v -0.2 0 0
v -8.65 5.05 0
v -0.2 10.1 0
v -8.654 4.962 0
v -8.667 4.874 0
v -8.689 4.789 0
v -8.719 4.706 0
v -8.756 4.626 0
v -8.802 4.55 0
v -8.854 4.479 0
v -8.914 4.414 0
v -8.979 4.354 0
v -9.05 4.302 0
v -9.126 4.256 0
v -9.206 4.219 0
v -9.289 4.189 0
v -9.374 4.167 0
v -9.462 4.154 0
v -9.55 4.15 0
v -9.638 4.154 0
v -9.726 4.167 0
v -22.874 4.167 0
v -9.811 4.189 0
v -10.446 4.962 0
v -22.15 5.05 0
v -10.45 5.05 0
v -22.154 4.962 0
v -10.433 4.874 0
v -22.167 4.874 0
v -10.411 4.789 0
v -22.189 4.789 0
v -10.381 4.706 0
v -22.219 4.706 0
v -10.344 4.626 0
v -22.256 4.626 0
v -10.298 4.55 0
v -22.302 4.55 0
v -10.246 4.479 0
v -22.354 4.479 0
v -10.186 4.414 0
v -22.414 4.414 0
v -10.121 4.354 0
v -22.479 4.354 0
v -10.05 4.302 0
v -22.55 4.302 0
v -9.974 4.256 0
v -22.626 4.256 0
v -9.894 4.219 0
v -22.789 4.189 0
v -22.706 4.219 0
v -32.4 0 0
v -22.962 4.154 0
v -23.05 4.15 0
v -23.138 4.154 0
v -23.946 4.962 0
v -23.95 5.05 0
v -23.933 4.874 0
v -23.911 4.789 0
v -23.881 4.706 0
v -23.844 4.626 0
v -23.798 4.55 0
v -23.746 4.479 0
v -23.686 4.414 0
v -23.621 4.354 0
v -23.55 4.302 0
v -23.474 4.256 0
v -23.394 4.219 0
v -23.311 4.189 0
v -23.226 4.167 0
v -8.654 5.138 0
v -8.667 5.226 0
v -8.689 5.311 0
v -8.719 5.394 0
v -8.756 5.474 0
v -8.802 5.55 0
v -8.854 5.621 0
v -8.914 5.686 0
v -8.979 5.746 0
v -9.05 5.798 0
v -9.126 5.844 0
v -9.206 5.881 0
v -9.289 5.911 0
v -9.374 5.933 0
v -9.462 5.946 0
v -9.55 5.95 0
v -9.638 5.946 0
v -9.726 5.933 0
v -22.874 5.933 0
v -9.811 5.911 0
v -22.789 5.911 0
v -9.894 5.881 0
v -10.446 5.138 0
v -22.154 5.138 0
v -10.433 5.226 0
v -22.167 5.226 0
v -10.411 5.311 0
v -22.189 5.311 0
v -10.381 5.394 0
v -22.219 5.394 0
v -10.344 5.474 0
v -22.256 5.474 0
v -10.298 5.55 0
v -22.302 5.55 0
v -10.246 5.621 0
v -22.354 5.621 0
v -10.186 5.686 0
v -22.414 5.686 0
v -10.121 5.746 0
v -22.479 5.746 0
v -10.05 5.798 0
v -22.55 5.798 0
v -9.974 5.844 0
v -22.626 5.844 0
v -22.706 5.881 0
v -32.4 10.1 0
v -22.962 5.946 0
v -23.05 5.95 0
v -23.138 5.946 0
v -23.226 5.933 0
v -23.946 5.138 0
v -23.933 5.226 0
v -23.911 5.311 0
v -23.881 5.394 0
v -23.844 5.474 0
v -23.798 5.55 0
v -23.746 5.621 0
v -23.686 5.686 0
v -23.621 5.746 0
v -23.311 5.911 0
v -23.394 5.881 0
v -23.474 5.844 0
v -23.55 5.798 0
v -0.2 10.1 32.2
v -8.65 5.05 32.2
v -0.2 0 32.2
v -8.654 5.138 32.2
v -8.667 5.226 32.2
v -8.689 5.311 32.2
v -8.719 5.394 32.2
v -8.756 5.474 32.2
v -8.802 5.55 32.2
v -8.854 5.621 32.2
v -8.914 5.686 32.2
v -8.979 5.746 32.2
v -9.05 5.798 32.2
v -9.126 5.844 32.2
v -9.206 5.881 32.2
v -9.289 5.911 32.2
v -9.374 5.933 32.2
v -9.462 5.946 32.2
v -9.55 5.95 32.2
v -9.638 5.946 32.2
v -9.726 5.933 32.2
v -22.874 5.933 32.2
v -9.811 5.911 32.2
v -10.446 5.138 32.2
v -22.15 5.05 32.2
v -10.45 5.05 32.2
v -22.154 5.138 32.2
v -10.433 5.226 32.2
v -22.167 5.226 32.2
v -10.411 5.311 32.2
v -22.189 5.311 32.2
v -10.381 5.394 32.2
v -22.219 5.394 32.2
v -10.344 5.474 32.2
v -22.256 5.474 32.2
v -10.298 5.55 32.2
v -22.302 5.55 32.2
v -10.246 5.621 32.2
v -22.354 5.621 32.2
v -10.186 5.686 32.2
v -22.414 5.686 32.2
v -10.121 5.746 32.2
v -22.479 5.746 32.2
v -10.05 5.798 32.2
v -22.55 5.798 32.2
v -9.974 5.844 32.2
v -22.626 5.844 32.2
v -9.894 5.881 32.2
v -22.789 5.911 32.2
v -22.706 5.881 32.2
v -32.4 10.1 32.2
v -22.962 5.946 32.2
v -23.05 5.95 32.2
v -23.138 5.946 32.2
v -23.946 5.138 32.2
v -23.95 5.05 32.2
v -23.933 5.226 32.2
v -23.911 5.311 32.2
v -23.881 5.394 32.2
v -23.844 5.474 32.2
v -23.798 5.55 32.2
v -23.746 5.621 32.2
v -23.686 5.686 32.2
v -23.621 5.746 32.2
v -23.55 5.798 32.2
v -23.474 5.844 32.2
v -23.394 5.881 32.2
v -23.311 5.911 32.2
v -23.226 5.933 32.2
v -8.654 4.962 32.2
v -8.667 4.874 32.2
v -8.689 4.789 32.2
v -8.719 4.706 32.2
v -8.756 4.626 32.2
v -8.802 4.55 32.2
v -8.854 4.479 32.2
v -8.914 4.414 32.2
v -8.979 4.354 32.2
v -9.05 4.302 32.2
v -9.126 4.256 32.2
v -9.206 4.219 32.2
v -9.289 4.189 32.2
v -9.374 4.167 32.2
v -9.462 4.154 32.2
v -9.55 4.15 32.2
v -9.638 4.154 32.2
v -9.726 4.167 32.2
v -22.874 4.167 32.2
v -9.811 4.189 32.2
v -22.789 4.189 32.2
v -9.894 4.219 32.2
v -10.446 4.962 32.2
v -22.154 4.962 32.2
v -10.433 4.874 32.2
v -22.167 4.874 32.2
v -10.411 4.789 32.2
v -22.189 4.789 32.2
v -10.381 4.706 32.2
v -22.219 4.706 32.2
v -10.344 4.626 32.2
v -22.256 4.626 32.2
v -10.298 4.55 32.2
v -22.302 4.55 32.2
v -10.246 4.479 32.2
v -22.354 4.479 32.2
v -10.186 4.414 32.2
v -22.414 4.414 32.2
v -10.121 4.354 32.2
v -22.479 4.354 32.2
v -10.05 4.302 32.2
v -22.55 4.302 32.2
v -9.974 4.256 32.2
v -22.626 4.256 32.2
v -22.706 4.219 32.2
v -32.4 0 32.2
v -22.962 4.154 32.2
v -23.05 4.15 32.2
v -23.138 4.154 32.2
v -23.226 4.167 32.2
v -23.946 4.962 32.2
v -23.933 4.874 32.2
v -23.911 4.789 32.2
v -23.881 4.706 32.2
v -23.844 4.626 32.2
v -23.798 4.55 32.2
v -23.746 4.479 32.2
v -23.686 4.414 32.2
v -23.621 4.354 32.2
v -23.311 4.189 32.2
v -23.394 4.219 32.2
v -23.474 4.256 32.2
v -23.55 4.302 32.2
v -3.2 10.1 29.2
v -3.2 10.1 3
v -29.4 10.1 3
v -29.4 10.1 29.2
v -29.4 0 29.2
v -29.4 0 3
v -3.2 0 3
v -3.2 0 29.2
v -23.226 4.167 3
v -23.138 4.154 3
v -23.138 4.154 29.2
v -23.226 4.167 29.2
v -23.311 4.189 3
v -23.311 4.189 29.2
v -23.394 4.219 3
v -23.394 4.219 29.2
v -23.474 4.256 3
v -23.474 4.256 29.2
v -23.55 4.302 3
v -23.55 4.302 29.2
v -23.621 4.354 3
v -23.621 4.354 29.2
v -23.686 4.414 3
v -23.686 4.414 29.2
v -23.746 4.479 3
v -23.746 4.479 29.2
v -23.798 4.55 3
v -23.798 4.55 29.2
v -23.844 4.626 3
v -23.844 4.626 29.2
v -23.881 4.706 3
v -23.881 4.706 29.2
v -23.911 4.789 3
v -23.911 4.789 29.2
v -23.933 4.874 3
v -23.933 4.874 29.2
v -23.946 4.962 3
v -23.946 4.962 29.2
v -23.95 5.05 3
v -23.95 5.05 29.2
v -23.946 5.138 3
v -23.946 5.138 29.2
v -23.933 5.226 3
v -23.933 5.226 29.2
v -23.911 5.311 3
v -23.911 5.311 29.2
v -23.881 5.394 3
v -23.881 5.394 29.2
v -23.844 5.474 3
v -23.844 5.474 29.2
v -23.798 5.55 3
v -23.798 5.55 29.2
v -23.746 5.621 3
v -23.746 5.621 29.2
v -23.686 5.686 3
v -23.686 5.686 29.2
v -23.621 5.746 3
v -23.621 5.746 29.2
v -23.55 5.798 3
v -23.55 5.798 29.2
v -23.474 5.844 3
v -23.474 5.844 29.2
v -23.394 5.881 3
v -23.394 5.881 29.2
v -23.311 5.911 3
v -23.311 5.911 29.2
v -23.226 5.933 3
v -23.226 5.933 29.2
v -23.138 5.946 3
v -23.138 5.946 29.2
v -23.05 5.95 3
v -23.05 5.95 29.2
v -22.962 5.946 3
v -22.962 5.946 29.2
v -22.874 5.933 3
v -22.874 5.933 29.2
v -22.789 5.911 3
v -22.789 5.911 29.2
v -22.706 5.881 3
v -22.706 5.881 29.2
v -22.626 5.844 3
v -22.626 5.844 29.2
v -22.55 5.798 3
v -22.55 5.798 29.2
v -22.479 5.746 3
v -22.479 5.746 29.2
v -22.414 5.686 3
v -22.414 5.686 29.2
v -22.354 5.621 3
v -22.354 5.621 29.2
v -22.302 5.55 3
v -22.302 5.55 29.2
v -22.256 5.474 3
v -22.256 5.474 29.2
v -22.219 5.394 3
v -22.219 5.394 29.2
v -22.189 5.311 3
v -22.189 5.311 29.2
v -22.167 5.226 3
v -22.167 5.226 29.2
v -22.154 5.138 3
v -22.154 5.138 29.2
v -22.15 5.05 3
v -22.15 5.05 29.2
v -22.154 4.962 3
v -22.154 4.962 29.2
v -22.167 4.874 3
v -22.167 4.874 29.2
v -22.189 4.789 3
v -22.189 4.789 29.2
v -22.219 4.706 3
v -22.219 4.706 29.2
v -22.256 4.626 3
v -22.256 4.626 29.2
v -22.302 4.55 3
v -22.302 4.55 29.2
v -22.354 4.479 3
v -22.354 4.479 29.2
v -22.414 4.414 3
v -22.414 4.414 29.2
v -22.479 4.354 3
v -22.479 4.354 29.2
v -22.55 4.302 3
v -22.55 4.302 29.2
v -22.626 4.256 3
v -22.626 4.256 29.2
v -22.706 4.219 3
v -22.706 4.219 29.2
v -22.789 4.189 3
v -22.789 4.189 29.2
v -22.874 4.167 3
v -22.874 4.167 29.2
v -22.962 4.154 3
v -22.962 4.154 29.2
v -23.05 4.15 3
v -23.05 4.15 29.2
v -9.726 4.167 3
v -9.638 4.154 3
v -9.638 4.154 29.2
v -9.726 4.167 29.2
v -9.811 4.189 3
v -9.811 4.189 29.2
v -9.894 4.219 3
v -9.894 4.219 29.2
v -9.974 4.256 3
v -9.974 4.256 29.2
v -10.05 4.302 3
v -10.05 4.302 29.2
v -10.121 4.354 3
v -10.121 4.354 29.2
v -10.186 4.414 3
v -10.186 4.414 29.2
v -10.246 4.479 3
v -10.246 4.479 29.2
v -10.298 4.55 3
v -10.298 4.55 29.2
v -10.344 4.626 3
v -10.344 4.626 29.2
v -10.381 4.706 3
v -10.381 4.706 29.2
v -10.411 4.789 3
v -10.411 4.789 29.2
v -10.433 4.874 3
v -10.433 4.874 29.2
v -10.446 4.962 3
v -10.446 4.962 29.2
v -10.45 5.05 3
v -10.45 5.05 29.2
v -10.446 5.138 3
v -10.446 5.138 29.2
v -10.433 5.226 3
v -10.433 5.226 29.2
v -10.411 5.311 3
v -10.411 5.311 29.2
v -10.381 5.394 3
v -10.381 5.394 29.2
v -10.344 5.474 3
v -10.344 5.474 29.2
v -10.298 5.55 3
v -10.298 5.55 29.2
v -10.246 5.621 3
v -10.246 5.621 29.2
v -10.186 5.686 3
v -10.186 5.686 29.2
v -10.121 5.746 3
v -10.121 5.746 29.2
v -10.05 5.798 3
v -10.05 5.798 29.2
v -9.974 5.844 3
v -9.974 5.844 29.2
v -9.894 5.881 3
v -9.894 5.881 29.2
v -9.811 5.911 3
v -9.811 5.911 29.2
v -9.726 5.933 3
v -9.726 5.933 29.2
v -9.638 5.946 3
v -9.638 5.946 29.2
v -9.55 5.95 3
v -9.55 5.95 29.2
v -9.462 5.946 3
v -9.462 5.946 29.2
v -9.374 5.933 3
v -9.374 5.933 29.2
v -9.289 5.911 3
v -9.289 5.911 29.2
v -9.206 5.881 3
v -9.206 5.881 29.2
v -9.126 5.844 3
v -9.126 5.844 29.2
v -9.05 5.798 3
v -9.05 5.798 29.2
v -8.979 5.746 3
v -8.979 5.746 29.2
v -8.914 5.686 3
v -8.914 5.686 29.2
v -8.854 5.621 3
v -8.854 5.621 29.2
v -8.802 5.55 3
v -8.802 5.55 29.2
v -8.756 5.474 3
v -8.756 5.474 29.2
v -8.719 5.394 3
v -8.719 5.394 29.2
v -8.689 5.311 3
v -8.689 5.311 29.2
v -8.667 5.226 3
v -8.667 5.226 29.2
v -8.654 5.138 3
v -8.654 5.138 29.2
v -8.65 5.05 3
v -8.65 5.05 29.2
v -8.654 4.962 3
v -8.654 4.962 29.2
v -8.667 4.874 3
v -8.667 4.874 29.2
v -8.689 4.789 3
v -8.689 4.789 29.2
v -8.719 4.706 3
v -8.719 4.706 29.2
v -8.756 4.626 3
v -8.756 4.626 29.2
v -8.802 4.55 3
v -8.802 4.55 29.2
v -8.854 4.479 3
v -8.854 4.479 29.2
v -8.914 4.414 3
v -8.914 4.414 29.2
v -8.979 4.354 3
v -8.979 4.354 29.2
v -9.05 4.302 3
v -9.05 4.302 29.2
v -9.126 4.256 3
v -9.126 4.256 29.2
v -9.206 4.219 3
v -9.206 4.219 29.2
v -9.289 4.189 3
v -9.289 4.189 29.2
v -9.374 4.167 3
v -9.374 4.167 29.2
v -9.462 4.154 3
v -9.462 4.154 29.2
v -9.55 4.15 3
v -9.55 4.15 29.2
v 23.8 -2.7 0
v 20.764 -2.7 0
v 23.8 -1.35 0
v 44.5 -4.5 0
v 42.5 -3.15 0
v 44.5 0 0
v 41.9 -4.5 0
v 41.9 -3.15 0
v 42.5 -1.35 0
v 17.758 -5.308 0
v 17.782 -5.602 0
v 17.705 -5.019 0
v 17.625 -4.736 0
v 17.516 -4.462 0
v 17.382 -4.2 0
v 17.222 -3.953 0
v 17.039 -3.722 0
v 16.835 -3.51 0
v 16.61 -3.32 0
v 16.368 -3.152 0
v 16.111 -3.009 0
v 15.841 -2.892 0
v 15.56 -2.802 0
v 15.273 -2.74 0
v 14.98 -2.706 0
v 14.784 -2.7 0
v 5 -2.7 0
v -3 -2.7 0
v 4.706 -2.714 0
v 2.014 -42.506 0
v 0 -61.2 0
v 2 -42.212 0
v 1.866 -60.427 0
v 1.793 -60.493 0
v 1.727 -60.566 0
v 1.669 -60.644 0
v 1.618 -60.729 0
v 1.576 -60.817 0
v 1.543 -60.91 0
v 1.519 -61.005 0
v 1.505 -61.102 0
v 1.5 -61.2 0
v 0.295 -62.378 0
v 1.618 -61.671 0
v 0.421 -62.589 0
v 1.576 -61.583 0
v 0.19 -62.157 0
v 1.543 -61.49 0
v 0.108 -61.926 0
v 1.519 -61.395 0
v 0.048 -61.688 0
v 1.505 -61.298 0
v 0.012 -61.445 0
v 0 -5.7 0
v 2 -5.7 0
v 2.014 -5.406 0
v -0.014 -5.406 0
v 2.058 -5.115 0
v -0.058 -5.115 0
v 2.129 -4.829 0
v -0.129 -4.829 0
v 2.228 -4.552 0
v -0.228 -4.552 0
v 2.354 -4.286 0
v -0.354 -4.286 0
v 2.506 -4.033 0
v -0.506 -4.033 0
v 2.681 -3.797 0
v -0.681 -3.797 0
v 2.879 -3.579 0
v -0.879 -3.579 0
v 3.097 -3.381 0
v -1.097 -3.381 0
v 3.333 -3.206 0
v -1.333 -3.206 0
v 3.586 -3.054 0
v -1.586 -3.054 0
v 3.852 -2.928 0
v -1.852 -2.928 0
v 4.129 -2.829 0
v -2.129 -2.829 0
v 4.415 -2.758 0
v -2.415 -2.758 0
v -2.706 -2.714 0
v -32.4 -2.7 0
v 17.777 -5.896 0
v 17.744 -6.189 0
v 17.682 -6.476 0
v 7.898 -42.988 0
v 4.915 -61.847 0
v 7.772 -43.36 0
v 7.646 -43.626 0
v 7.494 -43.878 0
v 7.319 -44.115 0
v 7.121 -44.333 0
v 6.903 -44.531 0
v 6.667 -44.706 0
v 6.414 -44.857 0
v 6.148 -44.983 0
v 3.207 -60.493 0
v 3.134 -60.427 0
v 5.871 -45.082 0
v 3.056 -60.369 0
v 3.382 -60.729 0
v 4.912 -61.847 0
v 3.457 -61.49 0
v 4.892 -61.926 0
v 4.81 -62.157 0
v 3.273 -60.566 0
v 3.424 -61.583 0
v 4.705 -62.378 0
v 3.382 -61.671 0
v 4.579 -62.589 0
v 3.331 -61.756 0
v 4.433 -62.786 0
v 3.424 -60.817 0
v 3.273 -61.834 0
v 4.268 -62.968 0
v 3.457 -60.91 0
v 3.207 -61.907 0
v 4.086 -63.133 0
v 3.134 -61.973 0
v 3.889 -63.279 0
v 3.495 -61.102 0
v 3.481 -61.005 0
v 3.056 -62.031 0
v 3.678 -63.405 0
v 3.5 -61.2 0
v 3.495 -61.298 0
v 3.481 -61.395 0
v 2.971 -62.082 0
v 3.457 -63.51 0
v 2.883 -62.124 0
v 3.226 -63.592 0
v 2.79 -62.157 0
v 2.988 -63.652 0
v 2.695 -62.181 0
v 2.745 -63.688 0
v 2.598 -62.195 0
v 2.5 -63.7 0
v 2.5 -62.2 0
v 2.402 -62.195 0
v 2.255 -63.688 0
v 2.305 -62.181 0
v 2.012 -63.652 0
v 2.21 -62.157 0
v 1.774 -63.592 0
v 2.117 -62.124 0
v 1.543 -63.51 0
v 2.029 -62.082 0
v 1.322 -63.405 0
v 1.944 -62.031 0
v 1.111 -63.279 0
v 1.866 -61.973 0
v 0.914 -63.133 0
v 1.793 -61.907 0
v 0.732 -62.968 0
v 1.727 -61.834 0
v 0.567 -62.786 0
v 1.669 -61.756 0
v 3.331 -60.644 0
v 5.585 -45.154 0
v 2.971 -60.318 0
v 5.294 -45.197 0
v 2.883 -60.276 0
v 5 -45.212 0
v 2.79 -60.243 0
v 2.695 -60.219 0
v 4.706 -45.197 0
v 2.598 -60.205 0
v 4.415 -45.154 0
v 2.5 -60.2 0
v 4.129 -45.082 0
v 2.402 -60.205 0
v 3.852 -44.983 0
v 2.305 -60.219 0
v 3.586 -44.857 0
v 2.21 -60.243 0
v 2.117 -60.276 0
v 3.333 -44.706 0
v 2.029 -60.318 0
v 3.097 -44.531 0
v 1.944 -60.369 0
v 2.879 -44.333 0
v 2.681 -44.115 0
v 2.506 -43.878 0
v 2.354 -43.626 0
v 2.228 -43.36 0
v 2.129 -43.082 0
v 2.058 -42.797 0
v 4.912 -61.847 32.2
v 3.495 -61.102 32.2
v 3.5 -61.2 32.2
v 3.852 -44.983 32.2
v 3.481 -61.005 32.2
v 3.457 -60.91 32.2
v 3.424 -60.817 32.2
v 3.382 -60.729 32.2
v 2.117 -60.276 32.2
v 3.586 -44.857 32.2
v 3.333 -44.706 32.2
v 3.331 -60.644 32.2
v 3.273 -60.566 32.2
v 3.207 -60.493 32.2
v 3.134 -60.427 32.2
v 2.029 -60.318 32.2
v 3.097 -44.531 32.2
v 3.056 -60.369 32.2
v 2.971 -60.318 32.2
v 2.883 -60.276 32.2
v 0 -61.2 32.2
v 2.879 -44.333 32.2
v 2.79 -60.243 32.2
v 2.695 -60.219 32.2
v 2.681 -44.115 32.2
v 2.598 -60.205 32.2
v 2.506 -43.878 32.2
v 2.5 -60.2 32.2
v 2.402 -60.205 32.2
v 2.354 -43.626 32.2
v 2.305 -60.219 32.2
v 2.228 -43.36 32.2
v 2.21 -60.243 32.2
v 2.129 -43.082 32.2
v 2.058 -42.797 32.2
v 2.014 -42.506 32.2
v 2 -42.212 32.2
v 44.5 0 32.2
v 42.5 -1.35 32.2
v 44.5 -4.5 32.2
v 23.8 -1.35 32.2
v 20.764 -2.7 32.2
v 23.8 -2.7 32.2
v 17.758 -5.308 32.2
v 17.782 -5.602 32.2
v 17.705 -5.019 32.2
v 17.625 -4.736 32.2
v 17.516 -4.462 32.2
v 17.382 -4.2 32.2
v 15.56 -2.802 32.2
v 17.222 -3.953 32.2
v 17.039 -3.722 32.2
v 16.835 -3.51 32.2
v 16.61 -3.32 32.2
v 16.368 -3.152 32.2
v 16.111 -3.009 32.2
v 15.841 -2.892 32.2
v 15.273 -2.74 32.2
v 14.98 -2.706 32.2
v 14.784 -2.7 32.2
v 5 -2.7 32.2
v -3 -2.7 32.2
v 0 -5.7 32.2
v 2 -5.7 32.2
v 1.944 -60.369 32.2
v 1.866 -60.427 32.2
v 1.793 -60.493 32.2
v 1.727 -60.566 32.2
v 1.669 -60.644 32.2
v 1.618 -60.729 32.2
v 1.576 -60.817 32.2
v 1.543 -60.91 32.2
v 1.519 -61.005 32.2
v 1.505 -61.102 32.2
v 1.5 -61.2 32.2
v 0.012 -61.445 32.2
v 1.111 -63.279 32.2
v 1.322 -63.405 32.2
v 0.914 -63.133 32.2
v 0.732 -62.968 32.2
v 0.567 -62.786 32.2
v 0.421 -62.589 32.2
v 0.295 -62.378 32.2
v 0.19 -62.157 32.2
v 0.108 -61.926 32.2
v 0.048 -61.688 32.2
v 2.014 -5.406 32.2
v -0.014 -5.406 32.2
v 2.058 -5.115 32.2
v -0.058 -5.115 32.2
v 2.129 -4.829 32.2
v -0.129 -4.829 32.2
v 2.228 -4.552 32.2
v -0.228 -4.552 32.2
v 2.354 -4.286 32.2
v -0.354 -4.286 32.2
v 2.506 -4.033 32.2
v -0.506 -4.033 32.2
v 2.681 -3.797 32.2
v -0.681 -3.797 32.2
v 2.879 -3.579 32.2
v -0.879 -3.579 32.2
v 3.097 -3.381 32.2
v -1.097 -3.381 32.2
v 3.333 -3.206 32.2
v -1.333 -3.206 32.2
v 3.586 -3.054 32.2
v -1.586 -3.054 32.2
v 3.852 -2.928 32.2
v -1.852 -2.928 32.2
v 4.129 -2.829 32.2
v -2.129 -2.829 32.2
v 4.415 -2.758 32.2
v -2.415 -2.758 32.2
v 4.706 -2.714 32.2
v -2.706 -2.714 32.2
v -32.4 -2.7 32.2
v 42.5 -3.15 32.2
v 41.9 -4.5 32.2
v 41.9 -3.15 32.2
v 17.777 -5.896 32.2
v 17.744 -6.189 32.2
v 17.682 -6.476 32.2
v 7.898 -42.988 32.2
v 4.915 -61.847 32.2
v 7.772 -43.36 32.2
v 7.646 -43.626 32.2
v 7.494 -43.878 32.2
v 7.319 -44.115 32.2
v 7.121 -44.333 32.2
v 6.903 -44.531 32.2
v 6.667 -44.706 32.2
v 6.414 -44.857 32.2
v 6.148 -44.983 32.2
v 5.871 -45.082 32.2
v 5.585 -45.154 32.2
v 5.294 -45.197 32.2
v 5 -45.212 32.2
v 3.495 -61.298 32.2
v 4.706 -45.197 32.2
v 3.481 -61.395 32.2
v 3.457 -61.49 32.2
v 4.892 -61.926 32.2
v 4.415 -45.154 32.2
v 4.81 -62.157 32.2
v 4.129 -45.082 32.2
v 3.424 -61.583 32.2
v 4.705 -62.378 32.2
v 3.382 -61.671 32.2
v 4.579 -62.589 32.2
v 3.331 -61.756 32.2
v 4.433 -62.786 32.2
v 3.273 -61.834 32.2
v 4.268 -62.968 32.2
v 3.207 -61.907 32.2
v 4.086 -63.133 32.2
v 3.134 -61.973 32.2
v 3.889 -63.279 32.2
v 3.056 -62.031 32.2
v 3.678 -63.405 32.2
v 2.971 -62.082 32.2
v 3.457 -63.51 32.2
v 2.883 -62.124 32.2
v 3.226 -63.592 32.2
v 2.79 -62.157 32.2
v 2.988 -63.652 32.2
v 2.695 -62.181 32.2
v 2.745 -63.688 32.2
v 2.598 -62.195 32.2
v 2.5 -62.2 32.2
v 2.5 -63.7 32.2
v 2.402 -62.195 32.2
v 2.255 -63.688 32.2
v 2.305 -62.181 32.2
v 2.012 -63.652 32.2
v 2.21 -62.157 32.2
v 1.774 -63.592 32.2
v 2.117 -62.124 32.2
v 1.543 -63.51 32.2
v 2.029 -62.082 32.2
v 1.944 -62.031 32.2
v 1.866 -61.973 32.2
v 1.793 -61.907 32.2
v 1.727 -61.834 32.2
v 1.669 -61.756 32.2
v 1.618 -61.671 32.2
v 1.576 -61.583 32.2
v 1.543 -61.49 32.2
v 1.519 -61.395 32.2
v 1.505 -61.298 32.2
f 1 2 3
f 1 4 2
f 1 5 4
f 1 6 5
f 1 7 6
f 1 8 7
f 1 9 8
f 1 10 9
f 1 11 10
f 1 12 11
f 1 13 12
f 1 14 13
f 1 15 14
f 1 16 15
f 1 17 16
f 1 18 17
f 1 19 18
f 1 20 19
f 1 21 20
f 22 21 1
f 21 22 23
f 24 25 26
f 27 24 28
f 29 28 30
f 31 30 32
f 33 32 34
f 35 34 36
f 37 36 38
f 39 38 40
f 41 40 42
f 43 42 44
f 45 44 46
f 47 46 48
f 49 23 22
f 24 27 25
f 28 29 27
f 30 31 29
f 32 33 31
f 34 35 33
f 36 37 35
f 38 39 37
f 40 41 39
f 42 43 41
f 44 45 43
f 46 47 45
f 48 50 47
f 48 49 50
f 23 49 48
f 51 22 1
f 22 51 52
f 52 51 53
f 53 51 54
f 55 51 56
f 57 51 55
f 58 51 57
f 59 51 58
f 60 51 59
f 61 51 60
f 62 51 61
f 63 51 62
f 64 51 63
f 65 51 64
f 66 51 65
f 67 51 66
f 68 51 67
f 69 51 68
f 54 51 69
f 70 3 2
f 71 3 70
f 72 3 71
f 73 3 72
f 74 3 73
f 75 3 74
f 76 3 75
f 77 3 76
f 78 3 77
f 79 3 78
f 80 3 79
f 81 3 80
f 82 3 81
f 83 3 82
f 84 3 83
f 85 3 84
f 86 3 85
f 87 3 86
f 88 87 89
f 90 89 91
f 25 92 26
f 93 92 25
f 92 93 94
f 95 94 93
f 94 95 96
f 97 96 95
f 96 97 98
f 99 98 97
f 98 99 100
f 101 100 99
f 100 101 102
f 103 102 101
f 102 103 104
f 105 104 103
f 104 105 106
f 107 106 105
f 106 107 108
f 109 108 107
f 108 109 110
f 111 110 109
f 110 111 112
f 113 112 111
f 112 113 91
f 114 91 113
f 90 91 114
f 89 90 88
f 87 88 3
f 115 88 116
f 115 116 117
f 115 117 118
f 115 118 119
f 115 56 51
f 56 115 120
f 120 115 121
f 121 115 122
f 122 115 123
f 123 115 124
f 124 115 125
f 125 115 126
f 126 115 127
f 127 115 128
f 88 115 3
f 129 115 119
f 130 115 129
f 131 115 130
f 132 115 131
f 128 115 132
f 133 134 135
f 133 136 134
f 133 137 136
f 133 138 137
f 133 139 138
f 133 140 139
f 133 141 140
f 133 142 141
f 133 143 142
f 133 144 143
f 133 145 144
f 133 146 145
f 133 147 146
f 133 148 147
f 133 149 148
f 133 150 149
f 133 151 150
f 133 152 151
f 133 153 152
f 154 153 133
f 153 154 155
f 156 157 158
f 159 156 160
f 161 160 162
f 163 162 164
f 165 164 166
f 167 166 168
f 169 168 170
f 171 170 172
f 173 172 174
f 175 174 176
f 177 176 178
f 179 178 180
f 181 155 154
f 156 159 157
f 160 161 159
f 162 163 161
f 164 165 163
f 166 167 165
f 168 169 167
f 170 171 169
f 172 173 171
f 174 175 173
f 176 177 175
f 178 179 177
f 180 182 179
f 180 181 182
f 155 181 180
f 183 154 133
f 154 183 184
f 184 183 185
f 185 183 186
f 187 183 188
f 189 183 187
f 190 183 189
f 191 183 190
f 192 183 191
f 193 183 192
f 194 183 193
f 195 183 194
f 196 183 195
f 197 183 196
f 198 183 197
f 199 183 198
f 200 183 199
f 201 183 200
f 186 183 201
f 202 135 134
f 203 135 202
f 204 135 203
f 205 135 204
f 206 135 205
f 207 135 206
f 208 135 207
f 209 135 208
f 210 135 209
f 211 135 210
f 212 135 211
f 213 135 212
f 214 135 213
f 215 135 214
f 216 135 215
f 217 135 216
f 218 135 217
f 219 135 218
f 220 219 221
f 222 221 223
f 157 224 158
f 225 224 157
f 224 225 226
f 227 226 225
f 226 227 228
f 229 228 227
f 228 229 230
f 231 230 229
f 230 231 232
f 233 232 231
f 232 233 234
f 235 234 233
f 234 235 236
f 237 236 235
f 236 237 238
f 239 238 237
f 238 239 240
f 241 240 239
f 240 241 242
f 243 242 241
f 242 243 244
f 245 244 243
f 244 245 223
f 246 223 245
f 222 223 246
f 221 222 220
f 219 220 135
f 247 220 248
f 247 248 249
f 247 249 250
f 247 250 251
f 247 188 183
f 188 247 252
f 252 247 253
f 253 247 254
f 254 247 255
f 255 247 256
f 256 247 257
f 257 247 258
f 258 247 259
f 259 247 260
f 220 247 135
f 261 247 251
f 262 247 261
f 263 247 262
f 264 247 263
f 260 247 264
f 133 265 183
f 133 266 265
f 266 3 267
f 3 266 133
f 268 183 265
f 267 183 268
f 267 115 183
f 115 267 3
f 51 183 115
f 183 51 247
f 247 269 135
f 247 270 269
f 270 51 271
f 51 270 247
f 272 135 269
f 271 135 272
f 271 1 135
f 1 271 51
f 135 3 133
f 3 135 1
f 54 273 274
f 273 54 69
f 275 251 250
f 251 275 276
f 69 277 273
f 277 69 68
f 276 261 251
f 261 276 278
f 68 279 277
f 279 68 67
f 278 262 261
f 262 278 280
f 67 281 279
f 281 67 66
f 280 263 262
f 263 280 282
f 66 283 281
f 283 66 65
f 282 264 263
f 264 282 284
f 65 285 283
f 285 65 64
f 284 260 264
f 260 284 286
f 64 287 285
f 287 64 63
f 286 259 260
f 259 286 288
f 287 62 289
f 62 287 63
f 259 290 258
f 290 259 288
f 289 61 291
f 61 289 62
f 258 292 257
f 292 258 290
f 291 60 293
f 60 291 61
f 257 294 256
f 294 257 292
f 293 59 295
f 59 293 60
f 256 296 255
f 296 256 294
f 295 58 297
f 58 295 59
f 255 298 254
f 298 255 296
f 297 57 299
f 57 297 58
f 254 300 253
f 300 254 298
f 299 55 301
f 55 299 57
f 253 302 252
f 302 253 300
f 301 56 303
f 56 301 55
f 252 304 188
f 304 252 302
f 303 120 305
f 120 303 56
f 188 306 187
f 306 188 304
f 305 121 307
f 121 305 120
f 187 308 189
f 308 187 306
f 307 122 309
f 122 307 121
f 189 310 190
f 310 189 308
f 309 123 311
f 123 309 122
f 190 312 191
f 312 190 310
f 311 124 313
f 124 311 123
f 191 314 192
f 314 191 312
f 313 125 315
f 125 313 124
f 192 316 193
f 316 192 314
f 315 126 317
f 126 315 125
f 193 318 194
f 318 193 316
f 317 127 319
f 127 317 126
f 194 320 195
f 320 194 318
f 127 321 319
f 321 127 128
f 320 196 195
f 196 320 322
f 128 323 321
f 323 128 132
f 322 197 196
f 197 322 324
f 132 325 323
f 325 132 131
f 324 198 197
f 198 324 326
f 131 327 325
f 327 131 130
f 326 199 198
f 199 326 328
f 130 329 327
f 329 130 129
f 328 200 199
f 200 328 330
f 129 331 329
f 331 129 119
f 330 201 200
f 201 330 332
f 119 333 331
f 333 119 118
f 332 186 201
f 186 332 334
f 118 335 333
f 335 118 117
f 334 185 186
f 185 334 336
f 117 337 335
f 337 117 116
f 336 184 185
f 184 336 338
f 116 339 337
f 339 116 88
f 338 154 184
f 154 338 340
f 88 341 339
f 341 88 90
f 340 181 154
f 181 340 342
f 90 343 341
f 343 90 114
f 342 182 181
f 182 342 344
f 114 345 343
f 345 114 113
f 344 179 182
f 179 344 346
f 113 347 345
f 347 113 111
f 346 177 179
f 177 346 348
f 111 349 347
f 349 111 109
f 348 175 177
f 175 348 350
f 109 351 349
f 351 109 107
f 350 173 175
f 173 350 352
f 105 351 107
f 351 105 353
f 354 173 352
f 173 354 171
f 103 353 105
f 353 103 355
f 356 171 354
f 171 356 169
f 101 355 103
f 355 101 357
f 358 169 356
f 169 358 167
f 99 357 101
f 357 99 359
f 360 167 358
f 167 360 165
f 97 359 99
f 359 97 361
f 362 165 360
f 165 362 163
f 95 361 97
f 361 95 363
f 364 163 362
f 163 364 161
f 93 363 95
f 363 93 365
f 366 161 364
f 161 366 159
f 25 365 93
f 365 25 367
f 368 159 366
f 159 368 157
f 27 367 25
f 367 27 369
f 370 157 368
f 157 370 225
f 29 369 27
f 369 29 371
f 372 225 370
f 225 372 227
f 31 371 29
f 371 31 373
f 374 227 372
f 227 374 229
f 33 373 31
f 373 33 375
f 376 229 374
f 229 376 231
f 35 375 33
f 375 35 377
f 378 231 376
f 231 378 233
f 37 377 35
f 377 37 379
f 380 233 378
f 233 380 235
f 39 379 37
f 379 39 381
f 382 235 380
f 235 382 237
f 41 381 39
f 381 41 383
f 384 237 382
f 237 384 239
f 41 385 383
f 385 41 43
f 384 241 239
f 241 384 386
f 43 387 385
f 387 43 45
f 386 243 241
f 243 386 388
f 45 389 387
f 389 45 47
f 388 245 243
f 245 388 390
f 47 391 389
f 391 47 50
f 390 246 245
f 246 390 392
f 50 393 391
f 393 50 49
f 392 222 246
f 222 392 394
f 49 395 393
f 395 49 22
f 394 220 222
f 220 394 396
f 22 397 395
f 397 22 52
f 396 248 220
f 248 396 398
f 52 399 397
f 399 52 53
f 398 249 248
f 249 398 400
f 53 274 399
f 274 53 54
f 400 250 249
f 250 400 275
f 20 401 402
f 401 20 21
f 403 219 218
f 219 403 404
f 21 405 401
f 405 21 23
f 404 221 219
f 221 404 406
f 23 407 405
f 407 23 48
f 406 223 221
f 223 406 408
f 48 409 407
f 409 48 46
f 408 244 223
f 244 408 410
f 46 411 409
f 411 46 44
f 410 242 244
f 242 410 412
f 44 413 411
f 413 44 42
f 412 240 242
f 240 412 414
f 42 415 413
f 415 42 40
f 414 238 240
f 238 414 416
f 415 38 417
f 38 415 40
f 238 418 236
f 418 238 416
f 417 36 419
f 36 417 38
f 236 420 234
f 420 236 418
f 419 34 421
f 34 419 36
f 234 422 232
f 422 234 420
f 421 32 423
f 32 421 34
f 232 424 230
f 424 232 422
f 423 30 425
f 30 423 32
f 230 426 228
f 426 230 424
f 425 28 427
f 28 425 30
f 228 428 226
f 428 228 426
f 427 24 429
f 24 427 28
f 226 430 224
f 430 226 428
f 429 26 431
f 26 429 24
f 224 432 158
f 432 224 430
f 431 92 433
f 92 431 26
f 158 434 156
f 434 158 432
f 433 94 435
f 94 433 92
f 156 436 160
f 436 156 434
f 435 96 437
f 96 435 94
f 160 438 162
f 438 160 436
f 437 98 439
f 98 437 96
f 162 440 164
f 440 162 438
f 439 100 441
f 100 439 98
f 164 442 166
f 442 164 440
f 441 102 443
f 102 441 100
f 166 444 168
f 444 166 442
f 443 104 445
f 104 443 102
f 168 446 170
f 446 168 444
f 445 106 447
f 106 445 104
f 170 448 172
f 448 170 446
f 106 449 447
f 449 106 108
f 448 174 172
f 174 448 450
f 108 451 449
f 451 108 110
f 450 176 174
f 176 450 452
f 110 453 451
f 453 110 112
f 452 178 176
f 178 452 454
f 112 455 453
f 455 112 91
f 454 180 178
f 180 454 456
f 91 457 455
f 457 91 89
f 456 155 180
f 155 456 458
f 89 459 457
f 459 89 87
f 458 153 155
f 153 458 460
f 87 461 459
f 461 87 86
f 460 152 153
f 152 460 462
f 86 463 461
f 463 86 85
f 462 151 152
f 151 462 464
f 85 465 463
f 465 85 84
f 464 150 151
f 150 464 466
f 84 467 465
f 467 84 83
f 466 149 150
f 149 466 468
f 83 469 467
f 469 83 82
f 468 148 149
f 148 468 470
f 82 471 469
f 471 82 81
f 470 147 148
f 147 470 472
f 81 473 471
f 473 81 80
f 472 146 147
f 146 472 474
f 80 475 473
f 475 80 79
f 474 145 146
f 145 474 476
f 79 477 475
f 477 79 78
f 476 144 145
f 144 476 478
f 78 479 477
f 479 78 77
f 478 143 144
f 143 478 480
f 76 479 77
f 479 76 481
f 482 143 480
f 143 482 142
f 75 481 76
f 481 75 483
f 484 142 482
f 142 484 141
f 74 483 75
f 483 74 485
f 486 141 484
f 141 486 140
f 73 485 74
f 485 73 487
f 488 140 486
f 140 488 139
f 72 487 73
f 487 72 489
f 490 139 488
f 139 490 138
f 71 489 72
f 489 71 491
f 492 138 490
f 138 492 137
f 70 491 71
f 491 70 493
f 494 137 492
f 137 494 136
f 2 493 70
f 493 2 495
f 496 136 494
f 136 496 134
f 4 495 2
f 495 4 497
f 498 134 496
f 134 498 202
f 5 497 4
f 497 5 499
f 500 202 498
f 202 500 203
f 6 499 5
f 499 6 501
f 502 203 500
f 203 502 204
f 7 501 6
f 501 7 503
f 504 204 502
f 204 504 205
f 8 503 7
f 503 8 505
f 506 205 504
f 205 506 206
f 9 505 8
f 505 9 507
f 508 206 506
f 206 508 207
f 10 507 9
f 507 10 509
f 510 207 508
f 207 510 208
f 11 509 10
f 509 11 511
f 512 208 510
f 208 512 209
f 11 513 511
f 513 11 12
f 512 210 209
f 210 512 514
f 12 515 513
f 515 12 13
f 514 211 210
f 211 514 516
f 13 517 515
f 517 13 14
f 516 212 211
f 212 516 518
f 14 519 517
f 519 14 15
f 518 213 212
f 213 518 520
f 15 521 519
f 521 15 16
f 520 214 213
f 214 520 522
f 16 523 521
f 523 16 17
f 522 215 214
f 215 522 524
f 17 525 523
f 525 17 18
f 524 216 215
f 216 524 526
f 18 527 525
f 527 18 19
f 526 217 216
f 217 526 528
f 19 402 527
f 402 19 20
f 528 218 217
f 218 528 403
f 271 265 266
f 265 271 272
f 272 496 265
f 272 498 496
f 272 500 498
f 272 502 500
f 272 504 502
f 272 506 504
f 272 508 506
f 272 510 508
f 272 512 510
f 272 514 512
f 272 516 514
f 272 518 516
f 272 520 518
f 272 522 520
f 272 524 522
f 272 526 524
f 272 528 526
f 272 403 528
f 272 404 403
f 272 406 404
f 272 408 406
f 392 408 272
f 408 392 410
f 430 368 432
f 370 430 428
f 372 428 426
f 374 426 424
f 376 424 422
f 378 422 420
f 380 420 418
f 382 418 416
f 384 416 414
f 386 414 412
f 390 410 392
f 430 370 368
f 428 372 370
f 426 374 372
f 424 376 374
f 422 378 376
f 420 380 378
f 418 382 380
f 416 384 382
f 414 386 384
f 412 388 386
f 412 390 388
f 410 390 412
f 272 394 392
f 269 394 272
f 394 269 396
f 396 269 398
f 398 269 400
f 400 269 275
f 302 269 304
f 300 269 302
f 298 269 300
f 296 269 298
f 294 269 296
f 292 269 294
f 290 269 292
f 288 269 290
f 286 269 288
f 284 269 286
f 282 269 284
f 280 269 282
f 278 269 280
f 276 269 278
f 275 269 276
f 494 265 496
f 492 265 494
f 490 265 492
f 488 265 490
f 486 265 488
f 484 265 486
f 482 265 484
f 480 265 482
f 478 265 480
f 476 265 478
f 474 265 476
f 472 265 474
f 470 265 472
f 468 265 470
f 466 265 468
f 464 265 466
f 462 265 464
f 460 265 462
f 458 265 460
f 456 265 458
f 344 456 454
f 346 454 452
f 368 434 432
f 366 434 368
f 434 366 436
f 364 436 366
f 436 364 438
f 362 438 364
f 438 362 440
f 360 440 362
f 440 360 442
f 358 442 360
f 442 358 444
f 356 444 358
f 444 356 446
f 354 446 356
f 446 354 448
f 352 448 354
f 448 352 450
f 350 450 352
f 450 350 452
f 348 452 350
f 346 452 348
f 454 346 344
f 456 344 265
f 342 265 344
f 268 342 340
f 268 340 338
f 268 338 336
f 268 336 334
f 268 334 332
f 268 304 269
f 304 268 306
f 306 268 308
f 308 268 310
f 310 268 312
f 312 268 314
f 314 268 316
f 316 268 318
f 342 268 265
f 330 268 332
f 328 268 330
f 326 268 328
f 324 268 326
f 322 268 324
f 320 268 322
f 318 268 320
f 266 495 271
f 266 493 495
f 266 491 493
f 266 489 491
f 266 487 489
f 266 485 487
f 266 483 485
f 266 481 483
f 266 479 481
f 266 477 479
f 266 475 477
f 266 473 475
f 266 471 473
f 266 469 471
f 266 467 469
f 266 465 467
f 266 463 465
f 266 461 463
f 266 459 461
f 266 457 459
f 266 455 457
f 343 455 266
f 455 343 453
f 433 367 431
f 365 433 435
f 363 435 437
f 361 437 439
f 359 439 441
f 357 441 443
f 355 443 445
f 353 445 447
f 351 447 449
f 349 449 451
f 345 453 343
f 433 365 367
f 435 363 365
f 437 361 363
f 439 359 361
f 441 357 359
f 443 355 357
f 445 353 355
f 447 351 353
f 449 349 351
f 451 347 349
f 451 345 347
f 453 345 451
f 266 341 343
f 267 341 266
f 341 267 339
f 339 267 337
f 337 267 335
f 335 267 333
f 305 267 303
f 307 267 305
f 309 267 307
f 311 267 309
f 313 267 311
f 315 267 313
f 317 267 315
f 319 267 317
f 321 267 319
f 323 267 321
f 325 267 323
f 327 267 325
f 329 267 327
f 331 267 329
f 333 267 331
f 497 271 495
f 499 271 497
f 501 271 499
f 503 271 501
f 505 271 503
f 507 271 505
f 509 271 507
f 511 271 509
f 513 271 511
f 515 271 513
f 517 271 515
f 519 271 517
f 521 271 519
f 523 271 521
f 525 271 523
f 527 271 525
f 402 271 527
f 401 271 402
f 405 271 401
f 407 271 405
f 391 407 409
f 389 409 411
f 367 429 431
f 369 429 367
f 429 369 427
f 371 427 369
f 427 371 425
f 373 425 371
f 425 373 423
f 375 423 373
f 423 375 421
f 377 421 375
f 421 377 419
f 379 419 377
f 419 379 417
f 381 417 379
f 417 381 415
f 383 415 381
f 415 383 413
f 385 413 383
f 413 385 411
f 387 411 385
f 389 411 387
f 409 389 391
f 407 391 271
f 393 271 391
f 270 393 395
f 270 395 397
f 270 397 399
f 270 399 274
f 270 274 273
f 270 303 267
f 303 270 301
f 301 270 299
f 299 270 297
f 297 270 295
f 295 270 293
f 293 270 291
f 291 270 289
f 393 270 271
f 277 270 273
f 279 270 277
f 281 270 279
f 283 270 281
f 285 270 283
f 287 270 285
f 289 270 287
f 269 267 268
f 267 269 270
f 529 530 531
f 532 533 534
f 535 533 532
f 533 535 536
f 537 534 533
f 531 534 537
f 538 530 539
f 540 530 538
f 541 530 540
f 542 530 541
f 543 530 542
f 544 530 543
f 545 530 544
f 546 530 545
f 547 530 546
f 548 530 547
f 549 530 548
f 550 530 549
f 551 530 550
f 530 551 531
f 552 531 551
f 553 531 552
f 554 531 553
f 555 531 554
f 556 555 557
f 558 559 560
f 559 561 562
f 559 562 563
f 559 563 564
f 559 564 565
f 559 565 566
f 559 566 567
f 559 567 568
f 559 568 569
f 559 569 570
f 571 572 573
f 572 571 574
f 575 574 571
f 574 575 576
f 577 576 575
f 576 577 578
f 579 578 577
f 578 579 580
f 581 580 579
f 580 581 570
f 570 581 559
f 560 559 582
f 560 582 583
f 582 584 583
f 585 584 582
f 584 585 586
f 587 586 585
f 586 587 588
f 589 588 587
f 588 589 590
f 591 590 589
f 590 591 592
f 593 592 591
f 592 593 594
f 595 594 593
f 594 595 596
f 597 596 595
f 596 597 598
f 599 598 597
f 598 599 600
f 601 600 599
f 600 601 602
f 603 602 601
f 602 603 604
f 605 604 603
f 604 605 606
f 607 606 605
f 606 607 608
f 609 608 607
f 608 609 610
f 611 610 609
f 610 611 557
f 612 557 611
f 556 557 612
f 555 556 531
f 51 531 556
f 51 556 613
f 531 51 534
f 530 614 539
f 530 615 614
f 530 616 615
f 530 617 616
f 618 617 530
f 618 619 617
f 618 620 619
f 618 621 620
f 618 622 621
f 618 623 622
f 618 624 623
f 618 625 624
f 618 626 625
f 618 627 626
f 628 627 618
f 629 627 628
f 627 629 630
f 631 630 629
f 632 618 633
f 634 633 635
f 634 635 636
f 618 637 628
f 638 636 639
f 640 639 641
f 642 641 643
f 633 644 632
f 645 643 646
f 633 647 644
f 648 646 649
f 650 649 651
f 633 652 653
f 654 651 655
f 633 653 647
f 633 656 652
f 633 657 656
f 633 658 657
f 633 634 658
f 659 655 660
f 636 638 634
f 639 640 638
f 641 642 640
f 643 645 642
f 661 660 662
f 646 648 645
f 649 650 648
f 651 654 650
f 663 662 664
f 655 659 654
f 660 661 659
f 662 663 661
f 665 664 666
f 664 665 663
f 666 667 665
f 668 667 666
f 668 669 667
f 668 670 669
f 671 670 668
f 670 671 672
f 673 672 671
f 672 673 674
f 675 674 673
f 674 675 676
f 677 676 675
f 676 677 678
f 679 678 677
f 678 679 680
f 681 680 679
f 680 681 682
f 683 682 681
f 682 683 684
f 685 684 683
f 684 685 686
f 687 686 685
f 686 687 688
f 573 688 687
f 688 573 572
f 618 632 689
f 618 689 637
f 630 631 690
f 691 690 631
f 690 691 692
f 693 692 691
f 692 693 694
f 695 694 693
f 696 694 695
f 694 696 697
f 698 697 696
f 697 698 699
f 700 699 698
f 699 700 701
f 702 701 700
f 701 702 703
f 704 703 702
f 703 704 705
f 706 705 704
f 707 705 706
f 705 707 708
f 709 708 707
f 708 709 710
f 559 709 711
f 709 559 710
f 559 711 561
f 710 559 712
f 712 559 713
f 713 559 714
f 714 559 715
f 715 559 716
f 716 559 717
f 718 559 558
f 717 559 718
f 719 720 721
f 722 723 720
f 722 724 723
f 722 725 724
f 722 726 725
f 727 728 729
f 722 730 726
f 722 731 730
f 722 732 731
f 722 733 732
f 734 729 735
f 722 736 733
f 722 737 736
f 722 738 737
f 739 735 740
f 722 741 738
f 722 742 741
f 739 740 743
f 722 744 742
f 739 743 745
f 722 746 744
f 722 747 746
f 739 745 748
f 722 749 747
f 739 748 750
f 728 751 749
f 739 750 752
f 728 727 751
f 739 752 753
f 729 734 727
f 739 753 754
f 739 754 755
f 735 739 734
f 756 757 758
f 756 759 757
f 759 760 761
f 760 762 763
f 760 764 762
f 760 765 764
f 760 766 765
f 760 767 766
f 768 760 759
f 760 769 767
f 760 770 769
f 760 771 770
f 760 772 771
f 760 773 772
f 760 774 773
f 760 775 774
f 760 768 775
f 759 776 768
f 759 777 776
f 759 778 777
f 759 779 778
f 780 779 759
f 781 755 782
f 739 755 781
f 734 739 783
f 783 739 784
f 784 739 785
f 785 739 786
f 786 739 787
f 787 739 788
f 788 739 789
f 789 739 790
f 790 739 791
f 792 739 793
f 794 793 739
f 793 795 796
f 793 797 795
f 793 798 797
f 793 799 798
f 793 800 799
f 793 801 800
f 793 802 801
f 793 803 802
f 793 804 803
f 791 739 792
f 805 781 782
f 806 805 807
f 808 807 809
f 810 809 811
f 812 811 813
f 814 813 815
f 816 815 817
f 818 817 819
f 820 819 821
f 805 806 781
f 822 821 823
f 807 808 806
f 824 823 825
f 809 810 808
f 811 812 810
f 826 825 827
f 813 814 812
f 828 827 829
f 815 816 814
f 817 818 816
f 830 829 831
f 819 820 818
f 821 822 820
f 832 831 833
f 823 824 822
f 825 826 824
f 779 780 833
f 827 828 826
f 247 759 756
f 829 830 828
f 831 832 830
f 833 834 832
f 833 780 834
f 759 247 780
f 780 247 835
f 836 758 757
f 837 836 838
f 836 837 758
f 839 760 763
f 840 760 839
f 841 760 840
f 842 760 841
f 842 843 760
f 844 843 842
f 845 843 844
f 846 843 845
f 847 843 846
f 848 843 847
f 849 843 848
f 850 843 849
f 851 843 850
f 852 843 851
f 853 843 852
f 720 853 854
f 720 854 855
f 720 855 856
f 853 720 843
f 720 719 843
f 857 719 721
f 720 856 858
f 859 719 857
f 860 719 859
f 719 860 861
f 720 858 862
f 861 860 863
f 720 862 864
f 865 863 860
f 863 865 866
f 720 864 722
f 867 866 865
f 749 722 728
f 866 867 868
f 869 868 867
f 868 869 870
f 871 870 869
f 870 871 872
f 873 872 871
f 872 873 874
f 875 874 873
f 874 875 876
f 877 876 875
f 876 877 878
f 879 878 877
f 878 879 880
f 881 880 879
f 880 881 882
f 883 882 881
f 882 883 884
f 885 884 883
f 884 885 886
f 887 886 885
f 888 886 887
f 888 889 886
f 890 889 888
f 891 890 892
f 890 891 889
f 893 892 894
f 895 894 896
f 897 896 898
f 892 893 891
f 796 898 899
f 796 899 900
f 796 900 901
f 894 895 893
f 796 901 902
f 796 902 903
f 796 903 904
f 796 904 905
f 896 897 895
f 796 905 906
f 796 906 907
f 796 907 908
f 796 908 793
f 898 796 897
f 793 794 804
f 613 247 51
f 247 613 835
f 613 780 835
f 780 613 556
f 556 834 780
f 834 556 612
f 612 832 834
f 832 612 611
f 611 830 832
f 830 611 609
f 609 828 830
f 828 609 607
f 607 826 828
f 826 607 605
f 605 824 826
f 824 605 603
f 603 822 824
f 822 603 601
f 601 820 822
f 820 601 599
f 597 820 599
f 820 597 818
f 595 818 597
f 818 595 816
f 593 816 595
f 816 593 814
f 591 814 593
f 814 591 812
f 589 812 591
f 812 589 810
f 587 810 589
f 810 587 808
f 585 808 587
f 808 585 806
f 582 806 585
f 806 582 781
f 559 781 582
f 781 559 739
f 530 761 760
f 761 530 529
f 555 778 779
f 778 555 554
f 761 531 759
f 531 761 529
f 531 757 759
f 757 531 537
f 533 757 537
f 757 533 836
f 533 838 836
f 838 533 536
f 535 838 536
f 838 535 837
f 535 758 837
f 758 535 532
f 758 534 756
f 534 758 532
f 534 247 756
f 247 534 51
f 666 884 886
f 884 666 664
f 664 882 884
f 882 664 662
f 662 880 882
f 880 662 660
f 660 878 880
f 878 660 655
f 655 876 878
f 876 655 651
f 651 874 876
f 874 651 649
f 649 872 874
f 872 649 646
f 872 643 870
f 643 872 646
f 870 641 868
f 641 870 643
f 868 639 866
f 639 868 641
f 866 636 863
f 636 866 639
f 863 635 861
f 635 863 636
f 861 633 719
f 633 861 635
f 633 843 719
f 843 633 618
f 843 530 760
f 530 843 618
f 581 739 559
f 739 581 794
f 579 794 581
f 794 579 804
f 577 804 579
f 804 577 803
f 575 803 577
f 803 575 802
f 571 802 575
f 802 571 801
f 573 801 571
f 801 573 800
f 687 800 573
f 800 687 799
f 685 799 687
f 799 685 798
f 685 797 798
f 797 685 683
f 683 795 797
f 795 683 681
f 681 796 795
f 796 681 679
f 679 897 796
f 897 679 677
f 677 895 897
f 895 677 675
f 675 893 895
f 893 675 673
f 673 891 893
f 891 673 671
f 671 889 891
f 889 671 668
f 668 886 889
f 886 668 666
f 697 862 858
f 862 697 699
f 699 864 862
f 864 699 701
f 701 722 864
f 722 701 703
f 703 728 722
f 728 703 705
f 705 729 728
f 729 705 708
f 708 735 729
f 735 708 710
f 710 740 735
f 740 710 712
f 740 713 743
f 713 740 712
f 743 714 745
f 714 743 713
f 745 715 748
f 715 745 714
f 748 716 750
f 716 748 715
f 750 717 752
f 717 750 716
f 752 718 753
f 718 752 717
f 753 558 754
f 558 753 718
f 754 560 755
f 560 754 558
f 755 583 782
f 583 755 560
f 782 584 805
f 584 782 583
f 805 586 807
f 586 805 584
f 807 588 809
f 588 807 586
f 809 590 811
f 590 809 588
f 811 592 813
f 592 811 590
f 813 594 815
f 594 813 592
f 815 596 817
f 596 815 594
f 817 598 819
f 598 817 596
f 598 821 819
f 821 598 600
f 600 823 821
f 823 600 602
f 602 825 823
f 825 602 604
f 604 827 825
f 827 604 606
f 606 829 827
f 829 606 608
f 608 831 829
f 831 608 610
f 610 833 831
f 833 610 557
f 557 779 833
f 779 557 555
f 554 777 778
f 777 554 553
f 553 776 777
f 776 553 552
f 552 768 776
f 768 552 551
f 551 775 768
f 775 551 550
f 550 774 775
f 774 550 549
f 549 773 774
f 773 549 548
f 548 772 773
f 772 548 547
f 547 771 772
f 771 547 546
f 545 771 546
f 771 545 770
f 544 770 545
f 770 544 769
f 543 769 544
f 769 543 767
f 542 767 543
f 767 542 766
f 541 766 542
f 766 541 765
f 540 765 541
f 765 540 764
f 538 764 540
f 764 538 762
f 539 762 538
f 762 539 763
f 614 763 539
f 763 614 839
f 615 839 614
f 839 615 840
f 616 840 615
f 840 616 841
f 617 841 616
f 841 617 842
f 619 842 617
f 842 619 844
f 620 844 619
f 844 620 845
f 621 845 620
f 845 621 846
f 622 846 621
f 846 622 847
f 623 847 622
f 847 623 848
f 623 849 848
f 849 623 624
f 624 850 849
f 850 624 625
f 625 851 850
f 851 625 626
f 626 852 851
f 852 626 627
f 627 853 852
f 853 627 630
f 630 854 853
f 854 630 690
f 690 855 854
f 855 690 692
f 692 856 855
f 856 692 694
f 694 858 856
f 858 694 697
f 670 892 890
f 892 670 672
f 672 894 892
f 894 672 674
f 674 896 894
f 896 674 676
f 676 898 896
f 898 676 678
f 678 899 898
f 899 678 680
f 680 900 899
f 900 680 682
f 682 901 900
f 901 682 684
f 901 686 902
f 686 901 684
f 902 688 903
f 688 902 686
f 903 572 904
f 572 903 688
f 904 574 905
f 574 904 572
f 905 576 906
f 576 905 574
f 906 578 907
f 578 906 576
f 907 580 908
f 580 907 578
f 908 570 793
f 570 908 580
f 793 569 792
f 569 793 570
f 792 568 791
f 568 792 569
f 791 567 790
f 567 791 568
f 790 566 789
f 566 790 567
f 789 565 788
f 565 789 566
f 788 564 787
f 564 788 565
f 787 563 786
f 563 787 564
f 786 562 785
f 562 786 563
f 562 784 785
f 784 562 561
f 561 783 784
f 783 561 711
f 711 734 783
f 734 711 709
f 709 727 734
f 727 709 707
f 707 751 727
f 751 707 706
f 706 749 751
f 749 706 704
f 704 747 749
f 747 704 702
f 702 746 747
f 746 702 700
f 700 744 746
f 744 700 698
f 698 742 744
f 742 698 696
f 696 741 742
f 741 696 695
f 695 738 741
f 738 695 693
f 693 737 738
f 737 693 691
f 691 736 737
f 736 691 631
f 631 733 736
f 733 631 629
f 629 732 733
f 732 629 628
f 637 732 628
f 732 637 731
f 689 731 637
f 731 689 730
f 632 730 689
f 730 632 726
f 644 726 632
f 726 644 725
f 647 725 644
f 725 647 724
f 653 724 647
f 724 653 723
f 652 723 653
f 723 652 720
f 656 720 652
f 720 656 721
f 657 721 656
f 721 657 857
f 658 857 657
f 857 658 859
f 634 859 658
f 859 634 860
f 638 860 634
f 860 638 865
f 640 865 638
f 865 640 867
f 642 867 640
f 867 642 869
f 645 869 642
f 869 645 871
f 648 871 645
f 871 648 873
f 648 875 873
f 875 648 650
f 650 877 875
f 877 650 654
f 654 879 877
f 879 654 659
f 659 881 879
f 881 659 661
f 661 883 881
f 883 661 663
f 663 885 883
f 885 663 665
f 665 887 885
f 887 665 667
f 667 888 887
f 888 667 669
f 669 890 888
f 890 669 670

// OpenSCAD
/* [Monitor] */
monTopWidth=18.7;
monFramThck=0.6;
monFramWdth=1.8;
//space behind the monitor for the wedge
monBackSpcng=23.8;

/* [Dimensions] */
//the horizontal platform thickness
platformThck=2.7;
//the vertical beam thickness
beamThck=3.2;
//the front wall facing the user
frntWallThck=2;
//offset of the box center to monitor front
boxOffset=-58.8; //[-80:0.5:0]
cornerRad=3;
//cannot be larger than monBackSpcng
wedgeWdth=21.3;
wedgeHght=61.2;
wedgeWallThck=2;

/* [Hidden] */
fudge=0.1;
// -- keep this values to stay compatible with other parts!
hldrWdth=32.2;
//walls of the square box
boxWallThck=3;
boxDims=[hldrWdth,hldrWdth,10.1];
boxPos=monBackSpcng+monTopWidth+boxOffset;
boxHoleDist=13.5;
boxHoleDia=1.8;
wedgeTipRad=2.5;
wedgeTipHoleDia=2;

wedgeWdthLim=min(wedgeWdth,monBackSpcng);
$fn=64;
//only the positive part
platformWdth= monBackSpcng + monTopWidth + frntWallThck ;

*rotate(-90) translate([-10.1,-32.4,0]) import("Brio100Support.stl");

//box  
translate([boxPos,0,0]) box();
platform();
wedge();

module platform(){
  //platform
  linear_extrude(hldrWdth){
    difference(){
      translate([0,-platformThck]) square([platformWdth,platformThck]);
      translate([platformWdth-monTopWidth-frntWallThck,-platformThck]) square([monTopWidth,platformThck/2]);
    }
    //front hook
    translate([platformWdth-frntWallThck,-monFramWdth-platformThck]) square([frntWallThck,monFramWdth+platformThck]);
    translate([platformWdth-frntWallThck-monFramThck,-monFramWdth-platformThck]) square([monFramThck,platformThck/2]);
    //if box is behind zero
    if ((boxPos-boxDims.x/2)<0)
      translate([boxPos-boxDims.x/2,-platformThck]) square([-boxPos+boxDims.x/2,platformThck]);
    //round the corner if feasible
    echo((boxPos-boxDims.x/2));
    if ((boxPos-boxDims.x/2)<-cornerRad)
      translate([0,-platformThck]) rotate(180) difference(){
        square(cornerRad);
        translate([cornerRad,cornerRad]) circle(cornerRad);
      }
  }
    
}

module wedge(){

  // Kreis
  r = wedgeTipRad;
  H = wedgeHght;
  w = wedgeWdthLim;
  t = platformThck-wedgeWallThck;
  
  // Abstand vom Kreismittelpunkt zum oberen Punkt der Hypotenuse
  dx = w - r;
  dy = H - t;
  d2 = dx*dx + dy*dy;

  // Tangentialpunkt, rechte Tangente
  k = r*r/d2;
  q = r*sqrt(d2-r*r)/d2;

  tangentX = r + k*dx + q*dy;
  tangentY = -H + k*dy - q*dx;

  wedgePoly=[
    [0,-t],
    [w,-t],
    [tangentX,tangentY],
    [0,-H]
  ];

  linear_extrude(hldrWdth) difference(){
    wedgeShape();
    offset(cornerRad) offset(-cornerRad-wedgeWallThck) wedgeShape();
    translate([r,-H]) circle(d=wedgeTipHoleDia);
  }
    
  
  module wedgeShape(){    
    translate([r,-H])
      circle(r);
    polygon(wedgePoly);
  }
}
  
  
module box(){
  difference(){
    translate([0,boxDims.z/2,0]) linear_extrude(hldrWdth,convexity=3) difference(){
       square([boxDims.x,boxDims.z],true);
      for (ix=[-1,1])
        translate([ix*boxHoleDist/2,0]) circle(d=boxHoleDia);
    }
    translate([0,(boxDims.z+fudge)/2,boxDims.y/2]) cube([boxDims.x-2*boxWallThck,boxDims.z+fudge,boxDims.y-2*boxWallThck],true);
  }
}
